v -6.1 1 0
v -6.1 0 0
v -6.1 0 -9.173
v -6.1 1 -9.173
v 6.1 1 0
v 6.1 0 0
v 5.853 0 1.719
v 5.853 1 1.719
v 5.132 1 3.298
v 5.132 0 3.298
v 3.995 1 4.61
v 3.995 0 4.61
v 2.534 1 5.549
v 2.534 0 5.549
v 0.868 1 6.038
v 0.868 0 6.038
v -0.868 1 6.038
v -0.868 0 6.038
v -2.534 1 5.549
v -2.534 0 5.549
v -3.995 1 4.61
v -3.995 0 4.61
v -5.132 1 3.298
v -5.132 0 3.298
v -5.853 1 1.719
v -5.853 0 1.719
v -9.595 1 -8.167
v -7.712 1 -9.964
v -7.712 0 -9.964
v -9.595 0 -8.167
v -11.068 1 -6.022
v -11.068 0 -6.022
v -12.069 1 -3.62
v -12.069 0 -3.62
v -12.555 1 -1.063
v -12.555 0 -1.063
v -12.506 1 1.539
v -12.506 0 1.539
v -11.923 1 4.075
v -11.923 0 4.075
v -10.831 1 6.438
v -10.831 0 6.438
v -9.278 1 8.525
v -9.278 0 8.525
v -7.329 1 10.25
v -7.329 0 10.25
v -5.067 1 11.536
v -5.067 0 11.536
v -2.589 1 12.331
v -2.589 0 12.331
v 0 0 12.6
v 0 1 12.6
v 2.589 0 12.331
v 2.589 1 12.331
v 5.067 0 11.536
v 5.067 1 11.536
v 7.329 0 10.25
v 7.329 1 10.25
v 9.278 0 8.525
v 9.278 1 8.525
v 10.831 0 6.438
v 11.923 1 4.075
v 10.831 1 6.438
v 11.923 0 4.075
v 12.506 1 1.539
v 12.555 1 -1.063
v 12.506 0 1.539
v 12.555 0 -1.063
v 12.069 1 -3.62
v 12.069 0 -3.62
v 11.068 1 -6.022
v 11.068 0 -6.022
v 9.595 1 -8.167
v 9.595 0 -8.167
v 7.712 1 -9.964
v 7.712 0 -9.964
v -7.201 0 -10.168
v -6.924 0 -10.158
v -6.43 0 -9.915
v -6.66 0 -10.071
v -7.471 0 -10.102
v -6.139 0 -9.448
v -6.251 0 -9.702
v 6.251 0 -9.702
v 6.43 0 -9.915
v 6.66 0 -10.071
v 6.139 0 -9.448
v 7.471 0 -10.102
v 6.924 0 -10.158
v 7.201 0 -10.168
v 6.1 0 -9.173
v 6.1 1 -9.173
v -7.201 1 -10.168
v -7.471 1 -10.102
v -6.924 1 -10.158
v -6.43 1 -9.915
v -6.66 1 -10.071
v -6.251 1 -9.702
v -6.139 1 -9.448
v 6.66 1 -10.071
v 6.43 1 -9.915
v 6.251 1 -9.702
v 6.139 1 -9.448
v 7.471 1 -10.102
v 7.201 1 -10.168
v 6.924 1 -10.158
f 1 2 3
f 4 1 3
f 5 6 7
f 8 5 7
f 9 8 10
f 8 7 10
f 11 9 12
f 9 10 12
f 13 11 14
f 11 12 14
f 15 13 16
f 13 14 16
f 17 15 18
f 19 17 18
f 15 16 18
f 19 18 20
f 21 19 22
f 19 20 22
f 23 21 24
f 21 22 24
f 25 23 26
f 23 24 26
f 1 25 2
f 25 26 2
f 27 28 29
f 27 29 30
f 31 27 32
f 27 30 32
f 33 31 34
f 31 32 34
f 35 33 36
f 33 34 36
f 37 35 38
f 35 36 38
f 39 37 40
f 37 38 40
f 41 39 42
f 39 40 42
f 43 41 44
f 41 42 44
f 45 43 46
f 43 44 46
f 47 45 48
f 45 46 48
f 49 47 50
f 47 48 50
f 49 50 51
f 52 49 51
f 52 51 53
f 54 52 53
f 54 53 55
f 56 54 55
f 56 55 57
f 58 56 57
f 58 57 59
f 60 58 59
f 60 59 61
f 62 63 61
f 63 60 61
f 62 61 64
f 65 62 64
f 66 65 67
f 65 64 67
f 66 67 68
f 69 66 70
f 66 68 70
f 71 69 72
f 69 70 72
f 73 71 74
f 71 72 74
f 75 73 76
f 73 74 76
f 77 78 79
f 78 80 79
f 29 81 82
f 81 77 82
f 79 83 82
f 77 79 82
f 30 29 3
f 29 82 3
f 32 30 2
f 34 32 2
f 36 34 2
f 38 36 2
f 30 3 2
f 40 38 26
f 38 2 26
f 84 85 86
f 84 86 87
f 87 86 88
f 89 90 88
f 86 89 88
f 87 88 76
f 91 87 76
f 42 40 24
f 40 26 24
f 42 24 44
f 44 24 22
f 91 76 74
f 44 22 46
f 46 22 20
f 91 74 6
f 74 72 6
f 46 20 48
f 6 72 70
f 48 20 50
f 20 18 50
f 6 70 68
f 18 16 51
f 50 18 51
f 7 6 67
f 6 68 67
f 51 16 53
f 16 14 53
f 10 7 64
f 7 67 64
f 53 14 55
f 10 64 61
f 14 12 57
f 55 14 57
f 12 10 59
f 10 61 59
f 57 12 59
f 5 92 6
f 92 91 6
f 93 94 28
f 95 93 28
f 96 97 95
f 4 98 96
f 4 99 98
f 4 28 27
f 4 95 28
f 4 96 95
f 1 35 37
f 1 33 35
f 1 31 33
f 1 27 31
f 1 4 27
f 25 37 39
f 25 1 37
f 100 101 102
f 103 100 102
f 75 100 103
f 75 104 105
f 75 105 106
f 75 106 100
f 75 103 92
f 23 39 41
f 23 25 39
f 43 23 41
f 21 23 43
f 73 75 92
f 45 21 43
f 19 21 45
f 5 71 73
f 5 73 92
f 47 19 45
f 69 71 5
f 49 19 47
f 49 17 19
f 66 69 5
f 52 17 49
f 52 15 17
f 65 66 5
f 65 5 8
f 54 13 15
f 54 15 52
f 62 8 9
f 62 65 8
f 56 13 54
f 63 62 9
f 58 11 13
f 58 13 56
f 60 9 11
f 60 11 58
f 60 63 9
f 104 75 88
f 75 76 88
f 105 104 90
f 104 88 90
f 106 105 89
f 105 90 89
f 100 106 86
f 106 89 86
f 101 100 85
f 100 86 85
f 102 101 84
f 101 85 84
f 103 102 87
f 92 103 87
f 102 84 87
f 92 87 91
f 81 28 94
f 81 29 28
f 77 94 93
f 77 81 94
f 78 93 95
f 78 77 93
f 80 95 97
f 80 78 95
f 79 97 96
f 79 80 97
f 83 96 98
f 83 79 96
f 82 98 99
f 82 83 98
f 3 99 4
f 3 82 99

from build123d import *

# Parameters (mm, degrees)
SKETCH1_R               = 12.6
BOSS_EXTRUDE1_DEPTH     = 1
CUT_EXTRUDE4_DEPTH      = 18.847128621
CUT_EXTRUDE4_DEPTH_BACK = 18.847128621
FILLET1_R               = 1


with BuildPart() as part:
    # Sketch1 → Boss-Extrude1 (new body)
    with BuildSketch(Plane(origin=(0, 0, 0), x_dir=(1, 0, 0), z_dir=(0, 1, 0))):
        with Locations(Location((0, 0, 0), (0, 0, 270))):
            Circle(SKETCH1_R)
    extrude(amount=BOSS_EXTRUDE1_DEPTH)

    # Sketch2 → Cut-Extrude4 (cut, two sides: drawn at the far end of the back side and taken through both)
    with BuildSketch(Plane(origin=(0, 0, 0), x_dir=(1, 0, 0), z_dir=(0, 1, 0)).offset(-CUT_EXTRUDE4_DEPTH_BACK)):
        with BuildLine():
            Line((-6.1, 0), (-6.1, 13.442202198))
            ThreePointArc((-6.1, 13.442202198), (0, 19.542202198), (6.1, 13.442202198))
            Line((6.1, 13.442202198), (6.1, 0))
            ThreePointArc((6.1, 0), (0, -6.1), (-6.1, 0))
        make_face()
    extrude(amount=CUT_EXTRUDE4_DEPTH + CUT_EXTRUDE4_DEPTH_BACK, mode=Mode.SUBTRACT)

    # Fillet1
    fillet1_edges = [part.edges().sort_by_distance(p)[0] for p in [
        (6.1, 0.5, -11.024971655),
        (-6.1, 0.5, -11.024971655),
    ]]
    fillet(fillet1_edges, radius=FILLET1_R)


solid = part.part
